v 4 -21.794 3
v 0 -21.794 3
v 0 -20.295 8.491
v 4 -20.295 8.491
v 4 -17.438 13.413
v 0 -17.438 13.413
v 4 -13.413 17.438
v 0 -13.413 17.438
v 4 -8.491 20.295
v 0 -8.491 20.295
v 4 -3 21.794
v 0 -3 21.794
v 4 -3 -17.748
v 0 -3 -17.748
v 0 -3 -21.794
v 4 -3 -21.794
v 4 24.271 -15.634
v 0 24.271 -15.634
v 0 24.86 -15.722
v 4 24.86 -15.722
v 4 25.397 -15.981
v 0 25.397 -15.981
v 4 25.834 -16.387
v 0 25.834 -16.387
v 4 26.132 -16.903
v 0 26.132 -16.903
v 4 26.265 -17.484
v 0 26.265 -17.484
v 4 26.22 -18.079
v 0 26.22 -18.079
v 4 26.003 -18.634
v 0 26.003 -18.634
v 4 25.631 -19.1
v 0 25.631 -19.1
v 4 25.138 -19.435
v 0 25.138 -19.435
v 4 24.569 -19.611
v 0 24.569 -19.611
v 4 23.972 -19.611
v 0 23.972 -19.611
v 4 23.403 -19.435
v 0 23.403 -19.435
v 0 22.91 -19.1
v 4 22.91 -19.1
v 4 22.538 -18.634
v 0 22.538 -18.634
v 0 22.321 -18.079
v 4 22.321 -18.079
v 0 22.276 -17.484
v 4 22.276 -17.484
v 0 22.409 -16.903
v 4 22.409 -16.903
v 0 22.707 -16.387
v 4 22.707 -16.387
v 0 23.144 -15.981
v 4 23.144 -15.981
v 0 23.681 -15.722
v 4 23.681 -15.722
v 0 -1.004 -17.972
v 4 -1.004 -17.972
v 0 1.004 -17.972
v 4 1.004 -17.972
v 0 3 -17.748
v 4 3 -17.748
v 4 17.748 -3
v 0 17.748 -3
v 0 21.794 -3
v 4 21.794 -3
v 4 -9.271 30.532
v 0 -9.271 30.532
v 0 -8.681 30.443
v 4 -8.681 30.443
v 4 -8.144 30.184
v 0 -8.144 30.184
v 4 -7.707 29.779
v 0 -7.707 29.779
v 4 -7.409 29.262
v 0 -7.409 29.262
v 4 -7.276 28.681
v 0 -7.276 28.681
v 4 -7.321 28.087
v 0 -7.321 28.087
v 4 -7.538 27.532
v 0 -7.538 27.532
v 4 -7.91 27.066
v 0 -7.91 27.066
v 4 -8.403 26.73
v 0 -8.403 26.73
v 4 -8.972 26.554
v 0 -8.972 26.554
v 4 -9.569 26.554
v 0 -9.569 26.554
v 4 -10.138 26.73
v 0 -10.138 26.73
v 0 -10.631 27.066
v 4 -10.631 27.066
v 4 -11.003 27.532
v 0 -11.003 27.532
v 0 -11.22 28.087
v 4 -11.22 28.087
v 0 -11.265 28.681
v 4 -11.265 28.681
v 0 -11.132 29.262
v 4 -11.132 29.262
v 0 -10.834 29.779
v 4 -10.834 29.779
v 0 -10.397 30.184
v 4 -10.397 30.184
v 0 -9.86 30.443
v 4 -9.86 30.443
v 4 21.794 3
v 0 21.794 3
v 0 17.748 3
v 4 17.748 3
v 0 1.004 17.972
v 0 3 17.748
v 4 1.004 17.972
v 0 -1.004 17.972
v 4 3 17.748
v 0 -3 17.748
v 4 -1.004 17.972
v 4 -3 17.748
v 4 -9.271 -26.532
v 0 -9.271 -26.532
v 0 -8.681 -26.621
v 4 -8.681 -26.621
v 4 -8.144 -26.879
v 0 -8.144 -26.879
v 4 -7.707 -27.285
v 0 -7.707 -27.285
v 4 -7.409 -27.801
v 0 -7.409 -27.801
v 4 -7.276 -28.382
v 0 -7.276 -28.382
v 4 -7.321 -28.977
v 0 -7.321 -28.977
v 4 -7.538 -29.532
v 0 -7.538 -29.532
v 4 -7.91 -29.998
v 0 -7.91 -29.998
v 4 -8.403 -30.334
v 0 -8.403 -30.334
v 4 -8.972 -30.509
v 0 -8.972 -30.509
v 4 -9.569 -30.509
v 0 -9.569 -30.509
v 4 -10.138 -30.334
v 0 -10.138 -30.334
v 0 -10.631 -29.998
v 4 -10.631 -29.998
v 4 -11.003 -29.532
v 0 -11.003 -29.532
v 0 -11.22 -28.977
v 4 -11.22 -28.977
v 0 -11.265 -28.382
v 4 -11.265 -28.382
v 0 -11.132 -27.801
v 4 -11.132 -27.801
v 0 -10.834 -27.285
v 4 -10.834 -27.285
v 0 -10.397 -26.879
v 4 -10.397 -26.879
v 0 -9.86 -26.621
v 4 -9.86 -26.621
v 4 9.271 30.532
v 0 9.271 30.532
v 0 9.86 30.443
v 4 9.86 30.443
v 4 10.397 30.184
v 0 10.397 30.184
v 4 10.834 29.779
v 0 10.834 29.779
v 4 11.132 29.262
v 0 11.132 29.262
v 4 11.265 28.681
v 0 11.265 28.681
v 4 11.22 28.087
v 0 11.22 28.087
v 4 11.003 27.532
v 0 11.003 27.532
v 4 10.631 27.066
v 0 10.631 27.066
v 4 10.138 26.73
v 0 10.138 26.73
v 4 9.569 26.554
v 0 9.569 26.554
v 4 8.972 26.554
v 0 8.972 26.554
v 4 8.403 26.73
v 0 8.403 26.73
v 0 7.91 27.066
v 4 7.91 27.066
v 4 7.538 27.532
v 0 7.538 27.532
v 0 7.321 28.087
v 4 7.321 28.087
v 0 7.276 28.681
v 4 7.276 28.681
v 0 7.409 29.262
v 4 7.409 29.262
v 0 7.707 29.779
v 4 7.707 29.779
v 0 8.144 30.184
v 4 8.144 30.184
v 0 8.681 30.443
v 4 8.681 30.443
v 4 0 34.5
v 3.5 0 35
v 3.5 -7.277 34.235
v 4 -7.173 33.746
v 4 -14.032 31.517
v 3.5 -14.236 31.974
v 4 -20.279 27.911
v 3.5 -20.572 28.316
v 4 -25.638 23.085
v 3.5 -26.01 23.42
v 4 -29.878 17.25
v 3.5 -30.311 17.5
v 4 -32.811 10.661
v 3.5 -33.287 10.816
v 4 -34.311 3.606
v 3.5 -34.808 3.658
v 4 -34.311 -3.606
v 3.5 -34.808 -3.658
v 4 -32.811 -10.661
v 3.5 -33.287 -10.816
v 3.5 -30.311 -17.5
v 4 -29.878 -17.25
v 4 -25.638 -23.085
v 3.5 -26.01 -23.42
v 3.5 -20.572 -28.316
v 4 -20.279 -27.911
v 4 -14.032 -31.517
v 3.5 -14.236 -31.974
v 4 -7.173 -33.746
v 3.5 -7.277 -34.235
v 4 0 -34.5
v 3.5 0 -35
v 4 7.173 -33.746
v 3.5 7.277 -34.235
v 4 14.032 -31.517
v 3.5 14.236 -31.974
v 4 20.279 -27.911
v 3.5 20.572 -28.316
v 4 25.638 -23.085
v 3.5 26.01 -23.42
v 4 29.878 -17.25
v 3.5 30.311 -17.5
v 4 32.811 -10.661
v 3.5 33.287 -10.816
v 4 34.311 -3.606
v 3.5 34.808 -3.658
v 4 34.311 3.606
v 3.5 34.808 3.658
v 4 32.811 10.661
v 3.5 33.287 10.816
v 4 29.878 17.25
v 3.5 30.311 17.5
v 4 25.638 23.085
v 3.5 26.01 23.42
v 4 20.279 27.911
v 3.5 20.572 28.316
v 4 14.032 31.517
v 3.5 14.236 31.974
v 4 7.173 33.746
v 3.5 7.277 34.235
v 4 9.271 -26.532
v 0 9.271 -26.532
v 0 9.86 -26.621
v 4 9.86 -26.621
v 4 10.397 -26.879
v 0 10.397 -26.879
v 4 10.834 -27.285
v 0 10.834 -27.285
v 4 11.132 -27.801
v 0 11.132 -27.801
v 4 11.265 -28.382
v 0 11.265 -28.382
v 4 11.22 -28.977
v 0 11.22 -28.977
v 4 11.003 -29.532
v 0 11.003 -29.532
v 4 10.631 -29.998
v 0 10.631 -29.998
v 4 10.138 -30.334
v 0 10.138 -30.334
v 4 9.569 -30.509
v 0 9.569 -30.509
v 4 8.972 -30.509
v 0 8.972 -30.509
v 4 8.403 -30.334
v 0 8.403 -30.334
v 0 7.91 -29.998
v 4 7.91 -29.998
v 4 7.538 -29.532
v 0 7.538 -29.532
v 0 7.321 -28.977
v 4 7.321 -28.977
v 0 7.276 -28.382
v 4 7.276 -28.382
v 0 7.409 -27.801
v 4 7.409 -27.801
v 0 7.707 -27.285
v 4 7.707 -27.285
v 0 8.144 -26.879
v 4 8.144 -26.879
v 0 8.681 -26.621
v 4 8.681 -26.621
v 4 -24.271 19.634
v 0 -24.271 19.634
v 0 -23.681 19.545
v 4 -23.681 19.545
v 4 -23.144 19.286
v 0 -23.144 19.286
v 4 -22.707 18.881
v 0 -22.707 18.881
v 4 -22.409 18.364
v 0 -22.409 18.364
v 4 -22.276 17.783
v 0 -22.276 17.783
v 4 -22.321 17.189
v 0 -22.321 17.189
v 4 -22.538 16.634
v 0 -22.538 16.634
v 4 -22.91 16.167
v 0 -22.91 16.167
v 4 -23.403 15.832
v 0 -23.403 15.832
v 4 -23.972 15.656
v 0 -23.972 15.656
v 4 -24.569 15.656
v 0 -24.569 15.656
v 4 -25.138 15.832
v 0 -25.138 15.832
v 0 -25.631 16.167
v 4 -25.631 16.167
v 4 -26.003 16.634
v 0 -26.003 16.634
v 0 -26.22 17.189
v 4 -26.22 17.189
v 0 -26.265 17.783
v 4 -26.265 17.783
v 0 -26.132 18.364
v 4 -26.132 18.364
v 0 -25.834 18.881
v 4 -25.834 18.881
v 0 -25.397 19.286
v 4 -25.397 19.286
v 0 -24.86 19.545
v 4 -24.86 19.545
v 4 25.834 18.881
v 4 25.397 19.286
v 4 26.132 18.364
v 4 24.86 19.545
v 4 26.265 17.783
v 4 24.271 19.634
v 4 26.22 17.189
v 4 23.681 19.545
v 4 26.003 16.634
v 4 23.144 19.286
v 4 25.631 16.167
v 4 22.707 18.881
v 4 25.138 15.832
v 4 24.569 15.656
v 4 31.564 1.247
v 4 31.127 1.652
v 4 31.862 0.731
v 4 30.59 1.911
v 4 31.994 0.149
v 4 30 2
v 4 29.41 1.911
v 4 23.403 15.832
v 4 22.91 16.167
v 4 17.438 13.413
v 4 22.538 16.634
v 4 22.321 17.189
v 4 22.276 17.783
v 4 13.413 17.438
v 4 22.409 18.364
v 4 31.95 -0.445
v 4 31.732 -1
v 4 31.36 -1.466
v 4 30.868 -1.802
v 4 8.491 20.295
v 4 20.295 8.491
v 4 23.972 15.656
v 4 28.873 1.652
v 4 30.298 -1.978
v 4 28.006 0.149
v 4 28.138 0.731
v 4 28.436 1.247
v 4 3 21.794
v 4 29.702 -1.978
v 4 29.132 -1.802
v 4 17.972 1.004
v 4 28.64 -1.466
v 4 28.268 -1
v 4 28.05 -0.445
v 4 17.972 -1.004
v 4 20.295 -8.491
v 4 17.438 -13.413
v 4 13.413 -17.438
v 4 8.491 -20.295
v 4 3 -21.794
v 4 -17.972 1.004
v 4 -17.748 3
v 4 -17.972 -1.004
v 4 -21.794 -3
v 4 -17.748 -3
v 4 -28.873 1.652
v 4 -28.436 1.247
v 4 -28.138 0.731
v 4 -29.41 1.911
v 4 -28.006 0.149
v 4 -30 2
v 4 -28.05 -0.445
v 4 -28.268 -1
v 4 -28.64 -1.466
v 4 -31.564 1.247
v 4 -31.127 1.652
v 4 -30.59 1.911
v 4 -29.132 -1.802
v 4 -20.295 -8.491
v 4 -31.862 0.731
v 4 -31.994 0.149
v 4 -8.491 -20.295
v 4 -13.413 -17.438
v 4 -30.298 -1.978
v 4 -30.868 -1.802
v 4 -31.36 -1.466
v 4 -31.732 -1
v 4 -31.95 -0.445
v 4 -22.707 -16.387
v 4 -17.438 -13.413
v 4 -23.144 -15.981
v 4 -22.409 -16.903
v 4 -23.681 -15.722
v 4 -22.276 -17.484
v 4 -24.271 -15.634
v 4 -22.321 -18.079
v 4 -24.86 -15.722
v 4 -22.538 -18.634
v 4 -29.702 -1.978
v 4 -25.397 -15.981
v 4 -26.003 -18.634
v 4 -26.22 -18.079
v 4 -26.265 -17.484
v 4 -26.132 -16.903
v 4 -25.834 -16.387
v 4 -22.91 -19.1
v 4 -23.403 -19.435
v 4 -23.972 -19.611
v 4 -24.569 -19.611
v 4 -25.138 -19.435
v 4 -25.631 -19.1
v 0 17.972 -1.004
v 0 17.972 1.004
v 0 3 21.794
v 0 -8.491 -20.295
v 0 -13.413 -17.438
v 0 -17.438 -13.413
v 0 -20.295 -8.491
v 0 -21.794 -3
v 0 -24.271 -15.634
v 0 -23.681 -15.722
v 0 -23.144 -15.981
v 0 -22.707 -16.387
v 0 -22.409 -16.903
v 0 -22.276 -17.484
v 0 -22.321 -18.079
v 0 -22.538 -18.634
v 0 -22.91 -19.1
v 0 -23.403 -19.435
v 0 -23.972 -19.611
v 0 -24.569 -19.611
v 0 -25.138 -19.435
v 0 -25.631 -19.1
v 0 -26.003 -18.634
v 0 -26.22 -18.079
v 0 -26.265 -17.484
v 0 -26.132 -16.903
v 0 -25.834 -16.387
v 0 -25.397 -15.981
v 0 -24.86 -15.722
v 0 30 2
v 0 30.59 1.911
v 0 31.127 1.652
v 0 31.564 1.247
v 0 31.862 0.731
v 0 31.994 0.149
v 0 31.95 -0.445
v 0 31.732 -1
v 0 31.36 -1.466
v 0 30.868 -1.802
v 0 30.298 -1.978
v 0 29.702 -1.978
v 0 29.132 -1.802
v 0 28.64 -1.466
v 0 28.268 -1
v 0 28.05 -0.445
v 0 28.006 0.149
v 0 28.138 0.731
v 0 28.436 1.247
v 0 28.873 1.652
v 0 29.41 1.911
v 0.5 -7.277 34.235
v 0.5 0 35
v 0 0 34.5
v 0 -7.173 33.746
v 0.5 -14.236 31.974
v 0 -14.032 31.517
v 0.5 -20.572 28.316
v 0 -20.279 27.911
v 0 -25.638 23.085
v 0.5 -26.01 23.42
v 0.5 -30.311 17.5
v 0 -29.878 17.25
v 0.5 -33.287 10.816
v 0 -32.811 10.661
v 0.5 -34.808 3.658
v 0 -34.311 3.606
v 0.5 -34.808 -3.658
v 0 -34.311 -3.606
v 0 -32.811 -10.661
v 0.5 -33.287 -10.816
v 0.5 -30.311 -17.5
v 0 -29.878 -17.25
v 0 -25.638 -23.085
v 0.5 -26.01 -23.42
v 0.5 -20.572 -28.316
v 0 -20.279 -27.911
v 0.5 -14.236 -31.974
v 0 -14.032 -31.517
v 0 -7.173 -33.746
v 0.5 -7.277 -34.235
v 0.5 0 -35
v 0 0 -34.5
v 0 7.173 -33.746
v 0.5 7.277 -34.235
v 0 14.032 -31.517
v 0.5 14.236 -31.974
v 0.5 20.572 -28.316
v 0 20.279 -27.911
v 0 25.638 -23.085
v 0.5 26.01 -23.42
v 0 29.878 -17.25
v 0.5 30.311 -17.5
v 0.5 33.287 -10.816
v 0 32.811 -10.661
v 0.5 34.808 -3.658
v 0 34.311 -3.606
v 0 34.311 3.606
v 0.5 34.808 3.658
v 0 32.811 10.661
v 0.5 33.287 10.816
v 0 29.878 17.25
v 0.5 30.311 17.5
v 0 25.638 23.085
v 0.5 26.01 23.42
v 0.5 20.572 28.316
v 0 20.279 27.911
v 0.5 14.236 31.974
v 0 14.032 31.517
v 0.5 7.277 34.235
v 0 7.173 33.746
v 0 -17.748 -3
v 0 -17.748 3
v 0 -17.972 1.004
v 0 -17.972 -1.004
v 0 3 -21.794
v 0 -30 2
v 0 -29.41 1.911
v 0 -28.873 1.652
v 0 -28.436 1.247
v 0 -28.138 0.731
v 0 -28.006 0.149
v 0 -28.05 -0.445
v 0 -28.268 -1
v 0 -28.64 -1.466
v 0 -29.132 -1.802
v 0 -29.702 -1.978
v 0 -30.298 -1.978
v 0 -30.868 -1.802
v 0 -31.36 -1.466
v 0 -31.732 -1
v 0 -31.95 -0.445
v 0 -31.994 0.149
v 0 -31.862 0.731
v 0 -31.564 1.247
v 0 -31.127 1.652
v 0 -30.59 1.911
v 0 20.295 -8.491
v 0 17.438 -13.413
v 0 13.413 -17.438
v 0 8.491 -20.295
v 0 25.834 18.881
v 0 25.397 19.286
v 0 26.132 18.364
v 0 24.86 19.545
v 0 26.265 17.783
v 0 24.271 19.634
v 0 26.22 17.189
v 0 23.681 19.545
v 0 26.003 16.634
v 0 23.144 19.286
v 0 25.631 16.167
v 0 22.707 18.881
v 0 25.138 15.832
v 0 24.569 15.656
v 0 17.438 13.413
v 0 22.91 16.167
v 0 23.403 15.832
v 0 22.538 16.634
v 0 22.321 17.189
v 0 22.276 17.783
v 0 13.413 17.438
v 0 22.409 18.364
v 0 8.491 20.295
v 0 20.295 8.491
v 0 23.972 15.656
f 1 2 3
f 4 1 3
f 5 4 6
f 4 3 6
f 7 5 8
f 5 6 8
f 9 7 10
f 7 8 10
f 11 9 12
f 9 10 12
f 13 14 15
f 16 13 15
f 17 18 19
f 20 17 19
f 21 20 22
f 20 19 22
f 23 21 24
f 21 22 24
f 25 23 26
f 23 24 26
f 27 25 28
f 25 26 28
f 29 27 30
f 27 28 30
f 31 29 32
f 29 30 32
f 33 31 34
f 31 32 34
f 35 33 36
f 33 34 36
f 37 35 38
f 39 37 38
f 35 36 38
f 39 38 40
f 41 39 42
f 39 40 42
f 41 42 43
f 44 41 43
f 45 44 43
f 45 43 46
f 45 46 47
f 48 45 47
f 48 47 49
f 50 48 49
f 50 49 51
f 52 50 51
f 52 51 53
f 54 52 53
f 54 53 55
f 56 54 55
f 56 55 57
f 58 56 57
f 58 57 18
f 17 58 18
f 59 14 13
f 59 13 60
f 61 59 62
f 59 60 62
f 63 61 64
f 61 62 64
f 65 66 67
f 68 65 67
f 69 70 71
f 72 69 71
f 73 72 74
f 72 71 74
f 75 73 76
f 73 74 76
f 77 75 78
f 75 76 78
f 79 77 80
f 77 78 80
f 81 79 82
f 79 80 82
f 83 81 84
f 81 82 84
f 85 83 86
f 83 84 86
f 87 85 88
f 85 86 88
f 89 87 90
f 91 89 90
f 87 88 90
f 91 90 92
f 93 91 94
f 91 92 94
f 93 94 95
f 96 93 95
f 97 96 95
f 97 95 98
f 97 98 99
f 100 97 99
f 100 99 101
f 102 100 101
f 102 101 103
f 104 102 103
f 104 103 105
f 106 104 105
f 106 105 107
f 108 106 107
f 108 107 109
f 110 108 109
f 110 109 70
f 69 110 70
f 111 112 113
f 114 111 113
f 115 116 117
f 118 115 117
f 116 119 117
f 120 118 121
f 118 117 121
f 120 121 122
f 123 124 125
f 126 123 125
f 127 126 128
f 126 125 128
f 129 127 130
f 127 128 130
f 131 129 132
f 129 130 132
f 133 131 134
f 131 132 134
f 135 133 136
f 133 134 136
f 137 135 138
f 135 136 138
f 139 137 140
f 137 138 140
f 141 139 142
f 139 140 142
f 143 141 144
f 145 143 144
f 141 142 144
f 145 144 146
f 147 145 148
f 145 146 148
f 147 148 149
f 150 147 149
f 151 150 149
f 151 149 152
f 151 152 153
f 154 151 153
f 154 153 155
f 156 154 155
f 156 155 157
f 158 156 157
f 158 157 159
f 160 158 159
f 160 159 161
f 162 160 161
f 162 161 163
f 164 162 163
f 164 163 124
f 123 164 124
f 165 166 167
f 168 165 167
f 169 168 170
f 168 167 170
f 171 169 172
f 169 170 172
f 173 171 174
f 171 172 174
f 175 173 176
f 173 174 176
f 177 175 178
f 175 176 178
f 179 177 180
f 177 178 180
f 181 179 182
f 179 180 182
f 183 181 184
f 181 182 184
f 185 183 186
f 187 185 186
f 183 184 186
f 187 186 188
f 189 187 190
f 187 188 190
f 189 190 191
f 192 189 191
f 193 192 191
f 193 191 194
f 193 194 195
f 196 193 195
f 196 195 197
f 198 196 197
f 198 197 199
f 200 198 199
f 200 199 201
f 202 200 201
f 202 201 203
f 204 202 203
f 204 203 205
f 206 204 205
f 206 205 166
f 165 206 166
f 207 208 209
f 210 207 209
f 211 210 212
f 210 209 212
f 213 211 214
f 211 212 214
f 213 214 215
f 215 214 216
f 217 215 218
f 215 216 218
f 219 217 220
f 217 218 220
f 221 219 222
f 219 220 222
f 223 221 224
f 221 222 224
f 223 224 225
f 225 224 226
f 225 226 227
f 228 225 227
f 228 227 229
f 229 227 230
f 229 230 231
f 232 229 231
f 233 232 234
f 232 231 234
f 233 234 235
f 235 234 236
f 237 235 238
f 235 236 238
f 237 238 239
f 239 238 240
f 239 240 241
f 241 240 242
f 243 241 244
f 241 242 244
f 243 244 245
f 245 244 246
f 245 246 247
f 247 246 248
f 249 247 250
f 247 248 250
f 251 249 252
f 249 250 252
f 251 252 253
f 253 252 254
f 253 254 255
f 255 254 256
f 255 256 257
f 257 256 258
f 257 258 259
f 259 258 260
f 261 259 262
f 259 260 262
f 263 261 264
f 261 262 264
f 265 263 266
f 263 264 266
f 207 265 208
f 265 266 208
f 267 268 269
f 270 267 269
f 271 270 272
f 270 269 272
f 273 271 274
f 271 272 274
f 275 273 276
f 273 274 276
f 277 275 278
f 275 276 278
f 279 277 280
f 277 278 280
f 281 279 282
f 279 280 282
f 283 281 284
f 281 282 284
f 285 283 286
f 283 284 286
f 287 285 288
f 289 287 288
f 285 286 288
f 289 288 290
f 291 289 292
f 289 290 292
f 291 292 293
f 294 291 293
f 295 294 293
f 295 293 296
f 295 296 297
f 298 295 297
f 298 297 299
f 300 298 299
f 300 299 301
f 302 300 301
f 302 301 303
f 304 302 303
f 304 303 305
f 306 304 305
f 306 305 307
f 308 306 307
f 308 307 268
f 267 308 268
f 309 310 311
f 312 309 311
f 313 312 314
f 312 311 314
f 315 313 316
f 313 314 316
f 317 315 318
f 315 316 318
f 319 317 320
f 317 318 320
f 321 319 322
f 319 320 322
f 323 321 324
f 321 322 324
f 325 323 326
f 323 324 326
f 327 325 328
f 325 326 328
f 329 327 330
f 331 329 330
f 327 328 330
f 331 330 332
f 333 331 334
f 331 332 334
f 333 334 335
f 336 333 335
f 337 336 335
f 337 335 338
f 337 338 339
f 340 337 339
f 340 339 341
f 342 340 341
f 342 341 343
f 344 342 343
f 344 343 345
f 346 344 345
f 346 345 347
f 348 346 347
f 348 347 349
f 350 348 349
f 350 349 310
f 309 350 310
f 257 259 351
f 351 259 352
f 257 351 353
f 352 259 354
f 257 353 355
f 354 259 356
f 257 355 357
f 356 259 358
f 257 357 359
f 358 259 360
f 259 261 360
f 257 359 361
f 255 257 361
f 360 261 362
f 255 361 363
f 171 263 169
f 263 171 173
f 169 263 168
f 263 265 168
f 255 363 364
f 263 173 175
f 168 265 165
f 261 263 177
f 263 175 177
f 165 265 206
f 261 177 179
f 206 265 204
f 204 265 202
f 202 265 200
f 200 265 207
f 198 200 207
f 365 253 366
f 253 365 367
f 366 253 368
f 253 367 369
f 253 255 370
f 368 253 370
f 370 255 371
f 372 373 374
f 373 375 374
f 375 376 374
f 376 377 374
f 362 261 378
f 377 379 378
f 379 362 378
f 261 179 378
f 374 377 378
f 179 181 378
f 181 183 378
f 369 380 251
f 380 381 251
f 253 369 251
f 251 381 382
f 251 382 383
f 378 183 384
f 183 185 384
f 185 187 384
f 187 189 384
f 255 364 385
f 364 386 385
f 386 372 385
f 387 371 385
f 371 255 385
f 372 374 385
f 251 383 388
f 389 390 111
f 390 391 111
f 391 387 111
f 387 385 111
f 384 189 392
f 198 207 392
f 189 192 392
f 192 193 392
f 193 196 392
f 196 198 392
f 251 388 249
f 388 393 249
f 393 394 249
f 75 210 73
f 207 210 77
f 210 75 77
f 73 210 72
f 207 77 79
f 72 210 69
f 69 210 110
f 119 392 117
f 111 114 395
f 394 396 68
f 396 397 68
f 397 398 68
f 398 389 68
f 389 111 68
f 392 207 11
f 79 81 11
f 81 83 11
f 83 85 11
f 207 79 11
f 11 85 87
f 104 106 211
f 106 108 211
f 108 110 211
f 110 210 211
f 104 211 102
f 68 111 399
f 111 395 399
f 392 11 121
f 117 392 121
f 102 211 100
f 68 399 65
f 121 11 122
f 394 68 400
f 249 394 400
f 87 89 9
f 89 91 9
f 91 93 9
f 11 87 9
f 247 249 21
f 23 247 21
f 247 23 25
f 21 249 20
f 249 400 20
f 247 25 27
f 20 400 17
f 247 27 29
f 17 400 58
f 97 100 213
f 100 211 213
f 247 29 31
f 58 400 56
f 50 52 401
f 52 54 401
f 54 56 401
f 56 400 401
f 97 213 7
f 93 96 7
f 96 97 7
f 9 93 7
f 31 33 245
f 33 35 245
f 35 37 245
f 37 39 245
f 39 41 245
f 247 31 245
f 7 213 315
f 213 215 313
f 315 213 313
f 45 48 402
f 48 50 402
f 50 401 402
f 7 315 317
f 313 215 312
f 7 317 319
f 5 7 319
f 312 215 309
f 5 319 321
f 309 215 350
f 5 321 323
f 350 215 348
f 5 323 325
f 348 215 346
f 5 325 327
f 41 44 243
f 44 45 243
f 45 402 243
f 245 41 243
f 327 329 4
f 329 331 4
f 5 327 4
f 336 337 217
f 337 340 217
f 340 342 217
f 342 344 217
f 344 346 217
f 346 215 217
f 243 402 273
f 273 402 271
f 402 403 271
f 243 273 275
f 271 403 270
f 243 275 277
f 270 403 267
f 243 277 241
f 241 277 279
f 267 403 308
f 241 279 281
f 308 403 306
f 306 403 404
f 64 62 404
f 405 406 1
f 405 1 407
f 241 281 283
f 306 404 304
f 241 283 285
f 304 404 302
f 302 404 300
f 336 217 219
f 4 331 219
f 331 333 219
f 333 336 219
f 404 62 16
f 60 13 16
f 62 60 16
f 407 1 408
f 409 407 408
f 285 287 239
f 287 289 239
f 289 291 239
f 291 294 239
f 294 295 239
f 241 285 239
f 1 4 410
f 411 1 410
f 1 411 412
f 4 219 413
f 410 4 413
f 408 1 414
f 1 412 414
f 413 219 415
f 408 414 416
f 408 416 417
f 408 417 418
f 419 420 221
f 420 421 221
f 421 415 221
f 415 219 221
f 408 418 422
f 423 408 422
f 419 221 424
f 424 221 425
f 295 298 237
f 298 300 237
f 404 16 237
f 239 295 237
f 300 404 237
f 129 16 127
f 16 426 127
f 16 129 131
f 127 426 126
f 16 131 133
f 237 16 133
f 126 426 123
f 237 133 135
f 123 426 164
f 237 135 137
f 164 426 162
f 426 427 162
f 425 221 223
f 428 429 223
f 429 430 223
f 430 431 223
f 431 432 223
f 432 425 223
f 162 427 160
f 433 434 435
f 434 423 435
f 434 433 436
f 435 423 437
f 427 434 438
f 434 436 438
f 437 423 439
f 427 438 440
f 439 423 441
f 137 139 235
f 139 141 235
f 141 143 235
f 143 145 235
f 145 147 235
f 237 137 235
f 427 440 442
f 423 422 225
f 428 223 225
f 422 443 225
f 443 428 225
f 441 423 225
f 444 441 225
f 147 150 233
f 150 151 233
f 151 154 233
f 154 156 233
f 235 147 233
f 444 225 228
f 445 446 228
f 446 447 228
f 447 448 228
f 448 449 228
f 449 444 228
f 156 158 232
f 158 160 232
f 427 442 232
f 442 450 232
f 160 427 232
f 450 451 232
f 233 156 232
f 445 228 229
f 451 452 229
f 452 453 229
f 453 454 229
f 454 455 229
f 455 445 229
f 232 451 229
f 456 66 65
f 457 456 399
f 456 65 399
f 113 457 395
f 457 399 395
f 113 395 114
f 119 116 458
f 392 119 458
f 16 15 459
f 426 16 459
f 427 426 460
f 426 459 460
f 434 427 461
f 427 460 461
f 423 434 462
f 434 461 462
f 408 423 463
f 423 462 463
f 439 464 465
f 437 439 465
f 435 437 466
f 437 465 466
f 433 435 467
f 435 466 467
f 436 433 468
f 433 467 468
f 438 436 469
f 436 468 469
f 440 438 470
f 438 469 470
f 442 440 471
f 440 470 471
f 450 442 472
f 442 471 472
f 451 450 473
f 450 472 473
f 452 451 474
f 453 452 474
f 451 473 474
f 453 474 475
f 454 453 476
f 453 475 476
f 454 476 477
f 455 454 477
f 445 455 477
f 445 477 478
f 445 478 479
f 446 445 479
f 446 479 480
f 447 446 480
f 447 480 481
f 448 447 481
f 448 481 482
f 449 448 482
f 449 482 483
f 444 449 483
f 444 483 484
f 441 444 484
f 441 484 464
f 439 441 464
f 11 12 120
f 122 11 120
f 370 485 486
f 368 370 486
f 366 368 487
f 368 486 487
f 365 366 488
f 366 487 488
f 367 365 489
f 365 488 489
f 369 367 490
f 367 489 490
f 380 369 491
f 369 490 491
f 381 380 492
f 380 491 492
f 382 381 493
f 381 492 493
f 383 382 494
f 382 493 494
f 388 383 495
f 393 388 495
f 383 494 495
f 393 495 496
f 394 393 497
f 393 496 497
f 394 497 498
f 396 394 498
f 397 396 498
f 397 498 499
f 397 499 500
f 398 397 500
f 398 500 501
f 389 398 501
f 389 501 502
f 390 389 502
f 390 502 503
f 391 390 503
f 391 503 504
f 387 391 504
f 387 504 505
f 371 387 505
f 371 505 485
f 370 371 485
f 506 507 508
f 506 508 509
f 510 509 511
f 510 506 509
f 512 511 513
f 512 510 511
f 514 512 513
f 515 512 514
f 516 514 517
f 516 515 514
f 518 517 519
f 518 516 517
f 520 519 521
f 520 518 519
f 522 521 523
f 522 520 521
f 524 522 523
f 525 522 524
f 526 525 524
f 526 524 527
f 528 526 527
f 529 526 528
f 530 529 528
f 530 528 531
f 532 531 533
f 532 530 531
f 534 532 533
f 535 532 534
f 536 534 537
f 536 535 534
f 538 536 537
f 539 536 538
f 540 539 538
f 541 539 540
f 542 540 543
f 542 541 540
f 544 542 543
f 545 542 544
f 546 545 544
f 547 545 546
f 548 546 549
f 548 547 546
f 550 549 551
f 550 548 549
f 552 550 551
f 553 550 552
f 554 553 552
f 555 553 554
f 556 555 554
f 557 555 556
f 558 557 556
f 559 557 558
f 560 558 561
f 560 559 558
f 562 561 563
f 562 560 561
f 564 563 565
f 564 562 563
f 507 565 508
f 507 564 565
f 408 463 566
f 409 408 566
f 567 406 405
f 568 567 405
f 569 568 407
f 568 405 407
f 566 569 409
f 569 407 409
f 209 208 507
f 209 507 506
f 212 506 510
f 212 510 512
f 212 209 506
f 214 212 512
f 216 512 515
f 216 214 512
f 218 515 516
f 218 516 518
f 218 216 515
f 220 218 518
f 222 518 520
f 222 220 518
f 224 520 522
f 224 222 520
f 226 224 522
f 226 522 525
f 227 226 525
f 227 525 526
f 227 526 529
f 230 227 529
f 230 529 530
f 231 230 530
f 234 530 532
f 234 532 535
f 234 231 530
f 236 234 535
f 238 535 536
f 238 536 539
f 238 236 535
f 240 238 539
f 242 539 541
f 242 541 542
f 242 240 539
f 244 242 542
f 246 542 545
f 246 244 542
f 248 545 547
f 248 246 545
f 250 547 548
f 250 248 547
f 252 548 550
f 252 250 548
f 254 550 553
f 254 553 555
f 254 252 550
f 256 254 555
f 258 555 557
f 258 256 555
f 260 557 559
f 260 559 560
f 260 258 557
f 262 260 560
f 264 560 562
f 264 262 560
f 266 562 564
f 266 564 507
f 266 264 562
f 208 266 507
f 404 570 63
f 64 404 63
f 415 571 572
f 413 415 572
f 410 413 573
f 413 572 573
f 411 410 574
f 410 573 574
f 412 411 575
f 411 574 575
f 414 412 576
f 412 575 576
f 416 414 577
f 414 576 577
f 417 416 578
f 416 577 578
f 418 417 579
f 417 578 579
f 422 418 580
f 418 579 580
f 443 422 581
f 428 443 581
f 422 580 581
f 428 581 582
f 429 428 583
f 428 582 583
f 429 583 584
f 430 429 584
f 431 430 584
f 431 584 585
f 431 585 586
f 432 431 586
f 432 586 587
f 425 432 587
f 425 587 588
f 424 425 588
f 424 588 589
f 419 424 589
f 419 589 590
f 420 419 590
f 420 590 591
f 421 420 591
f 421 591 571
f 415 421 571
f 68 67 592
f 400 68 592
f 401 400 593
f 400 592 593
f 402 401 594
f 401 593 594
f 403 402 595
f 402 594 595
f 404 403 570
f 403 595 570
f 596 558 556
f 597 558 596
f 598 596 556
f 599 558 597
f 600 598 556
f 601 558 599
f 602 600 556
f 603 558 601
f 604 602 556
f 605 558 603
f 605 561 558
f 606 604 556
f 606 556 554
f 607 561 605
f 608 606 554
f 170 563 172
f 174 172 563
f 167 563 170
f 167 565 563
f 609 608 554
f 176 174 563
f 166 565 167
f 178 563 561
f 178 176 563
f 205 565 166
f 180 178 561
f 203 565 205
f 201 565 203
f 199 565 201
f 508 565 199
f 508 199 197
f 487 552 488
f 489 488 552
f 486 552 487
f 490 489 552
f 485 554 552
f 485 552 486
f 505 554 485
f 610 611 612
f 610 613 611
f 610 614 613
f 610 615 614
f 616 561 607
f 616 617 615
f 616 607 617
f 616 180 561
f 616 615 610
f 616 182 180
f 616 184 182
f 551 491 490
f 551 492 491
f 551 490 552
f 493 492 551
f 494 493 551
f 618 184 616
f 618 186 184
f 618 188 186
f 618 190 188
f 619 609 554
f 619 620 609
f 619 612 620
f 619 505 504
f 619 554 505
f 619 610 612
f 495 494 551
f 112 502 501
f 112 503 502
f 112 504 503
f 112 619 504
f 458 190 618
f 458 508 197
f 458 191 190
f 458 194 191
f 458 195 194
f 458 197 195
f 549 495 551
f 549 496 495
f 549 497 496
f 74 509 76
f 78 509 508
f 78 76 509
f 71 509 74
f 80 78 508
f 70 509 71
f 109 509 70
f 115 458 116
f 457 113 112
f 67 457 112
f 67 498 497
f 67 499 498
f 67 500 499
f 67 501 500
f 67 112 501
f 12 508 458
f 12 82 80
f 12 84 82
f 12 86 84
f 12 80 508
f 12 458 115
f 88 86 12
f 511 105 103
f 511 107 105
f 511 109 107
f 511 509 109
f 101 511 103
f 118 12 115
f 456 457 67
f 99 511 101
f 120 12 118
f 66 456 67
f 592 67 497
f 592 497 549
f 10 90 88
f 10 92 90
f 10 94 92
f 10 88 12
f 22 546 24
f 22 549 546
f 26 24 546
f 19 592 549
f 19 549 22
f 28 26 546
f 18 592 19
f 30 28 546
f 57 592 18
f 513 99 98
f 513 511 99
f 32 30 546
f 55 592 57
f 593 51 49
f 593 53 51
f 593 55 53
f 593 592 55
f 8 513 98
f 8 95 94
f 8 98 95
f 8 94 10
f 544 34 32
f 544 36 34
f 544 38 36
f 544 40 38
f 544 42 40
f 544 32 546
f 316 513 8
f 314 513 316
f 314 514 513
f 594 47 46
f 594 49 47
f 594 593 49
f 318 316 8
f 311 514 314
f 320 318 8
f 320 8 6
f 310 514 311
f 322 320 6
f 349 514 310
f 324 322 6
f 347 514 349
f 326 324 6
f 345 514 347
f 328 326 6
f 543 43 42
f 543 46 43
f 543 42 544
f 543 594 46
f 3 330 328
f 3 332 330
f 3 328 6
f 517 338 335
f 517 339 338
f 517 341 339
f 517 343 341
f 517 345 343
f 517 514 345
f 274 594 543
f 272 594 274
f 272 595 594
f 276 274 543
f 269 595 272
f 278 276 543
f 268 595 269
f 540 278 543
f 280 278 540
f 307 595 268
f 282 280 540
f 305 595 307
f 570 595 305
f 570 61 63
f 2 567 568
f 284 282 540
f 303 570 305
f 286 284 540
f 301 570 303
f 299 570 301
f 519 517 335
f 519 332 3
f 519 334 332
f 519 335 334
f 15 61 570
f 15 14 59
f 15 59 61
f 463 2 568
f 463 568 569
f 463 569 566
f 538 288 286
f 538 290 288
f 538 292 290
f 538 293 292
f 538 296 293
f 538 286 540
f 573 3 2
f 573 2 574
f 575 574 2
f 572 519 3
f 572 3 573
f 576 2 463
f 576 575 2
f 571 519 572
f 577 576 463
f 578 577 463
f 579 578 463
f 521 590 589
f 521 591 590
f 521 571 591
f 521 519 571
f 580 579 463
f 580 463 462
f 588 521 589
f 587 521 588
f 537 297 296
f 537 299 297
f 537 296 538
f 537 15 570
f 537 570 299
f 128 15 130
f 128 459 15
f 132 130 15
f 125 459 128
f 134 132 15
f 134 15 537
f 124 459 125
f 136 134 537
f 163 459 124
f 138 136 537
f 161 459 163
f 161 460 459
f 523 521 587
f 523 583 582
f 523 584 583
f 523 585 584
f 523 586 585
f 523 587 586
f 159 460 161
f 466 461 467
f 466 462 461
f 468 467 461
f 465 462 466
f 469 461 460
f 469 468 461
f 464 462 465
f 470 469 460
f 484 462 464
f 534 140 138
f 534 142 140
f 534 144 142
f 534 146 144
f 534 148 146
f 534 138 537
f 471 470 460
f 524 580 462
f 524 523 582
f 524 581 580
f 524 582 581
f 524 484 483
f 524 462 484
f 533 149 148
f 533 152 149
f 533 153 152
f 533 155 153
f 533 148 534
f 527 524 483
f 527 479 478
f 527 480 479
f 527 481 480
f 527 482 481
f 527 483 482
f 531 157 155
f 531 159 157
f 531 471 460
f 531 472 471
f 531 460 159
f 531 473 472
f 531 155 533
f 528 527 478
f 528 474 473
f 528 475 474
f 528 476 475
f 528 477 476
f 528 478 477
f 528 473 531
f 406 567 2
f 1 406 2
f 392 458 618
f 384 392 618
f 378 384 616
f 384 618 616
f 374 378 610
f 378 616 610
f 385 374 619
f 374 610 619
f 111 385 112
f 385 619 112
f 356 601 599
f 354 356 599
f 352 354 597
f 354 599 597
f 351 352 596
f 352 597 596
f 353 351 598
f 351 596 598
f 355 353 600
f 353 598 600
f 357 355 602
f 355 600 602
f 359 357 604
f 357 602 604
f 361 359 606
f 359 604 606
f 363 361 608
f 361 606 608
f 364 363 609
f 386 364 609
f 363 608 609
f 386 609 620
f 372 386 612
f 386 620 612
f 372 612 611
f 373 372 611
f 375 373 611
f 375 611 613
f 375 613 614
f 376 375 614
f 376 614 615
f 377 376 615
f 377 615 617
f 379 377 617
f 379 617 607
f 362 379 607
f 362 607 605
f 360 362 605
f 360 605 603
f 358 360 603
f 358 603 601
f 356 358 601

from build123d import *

# Parameters (mm, degrees)
ESQUISSE1_W             = 4
ESQUISSE1_H             = 17
ENL_V_MAT_EXTRU_1_DEPTH = 50.658836072
CHANFREIN1_SIZE         = 0.5
ESQUISSE3_R             = 2
ENL_V_MAT_EXTRU_2_DEPTH = 50.658836072


with BuildPart() as part:
    # Esquisse1 → Base-Révolution (revolve)
    with BuildSketch(Plane.XY, mode=Mode.PRIVATE) as base_r_volution_sk:
        with Locations((2, 26.5)):
            Rectangle(ESQUISSE1_W, ESQUISSE1_H)
    revolve(base_r_volution_sk.sketch.rotate(Axis((0, 0, 0), (1, 0, 0)), 90), axis=Axis((0, 0, 0), (1, 0, 0)))

    # Esquisse2 → Enlèv. mat.-Extru.1 (cut, through all)
    with BuildSketch(Plane.ZY):
        with BuildLine():
            Line((-3, 16), (-3, 21.794494718))
            ThreePointArc((-3, 21.794494718), (-15.556349186, 15.556349186), (-21.794494718, 3))
            Line((-21.794494718, 3), (-16, 3))
            Line((-16, 3), (-16, -3))
            Line((-16, -3), (-21.794494718, -3))
            ThreePointArc((-21.794494718, -3), (-15.556349186, -15.556349186), (-3, -21.794494718))
            Line((-3, -21.794494718), (-3, -16))
            Line((-3, -16), (3, -16))
            Line((3, -16), (3, -21.794494718))
            ThreePointArc((3, -21.794494718), (15.556349186, -15.556349186), (21.794494718, -3))
            Line((21.794494718, -3), (16, -3))
            Line((16, -3), (16, 3))
            Line((16, 3), (21.794494718, 3))
            ThreePointArc((21.794494718, 3), (15.556349186, 15.556349186), (3, 21.794494718))
            Line((3, 21.794494718), (3, 16))
            Line((3, 16), (-3, 16))
        make_face()
    extrude(amount=-ENL_V_MAT_EXTRU_1_DEPTH, mode=Mode.SUBTRACT)

    # Chanfrein1
    chanfrein1_edges = [part.edges().sort_by_distance(p)[0] for p in [
        (0, 0, -35),
        (4, 0, -35),
    ]]
    chamfer(chanfrein1_edges, length=CHANFREIN1_SIZE)

    # Esquisse3 → Enlèv. mat.-Extru.2 (cut, through all)
    with BuildSketch(Plane.ZY):
        with Locations((0, 30)):
            Circle(ESQUISSE3_R)
        with Locations((17.633557569, 24.270509831)):
            Circle(ESQUISSE3_R)
        with Locations((28.531695489, 9.270509831)):
            Circle(ESQUISSE3_R)
        with Locations((28.531695489, -9.270509831)):
            Circle(ESQUISSE3_R)
        with Locations((17.633557569, -24.270509831)):
            Circle(ESQUISSE3_R)
        with Locations((0, -30)):
            Circle(ESQUISSE3_R)
        with Locations((-17.633557569, -24.270509831)):
            Circle(ESQUISSE3_R)
        with Locations((-28.531695489, -9.270509831)):
            Circle(ESQUISSE3_R)
        with Locations((-28.531695489, 9.270509831)):
            Circle(ESQUISSE3_R)
        with Locations((-17.633557569, 24.270509831)):
            Circle(ESQUISSE3_R)
    extrude(amount=-ENL_V_MAT_EXTRU_2_DEPTH, mode=Mode.SUBTRACT)


solid = part.part
